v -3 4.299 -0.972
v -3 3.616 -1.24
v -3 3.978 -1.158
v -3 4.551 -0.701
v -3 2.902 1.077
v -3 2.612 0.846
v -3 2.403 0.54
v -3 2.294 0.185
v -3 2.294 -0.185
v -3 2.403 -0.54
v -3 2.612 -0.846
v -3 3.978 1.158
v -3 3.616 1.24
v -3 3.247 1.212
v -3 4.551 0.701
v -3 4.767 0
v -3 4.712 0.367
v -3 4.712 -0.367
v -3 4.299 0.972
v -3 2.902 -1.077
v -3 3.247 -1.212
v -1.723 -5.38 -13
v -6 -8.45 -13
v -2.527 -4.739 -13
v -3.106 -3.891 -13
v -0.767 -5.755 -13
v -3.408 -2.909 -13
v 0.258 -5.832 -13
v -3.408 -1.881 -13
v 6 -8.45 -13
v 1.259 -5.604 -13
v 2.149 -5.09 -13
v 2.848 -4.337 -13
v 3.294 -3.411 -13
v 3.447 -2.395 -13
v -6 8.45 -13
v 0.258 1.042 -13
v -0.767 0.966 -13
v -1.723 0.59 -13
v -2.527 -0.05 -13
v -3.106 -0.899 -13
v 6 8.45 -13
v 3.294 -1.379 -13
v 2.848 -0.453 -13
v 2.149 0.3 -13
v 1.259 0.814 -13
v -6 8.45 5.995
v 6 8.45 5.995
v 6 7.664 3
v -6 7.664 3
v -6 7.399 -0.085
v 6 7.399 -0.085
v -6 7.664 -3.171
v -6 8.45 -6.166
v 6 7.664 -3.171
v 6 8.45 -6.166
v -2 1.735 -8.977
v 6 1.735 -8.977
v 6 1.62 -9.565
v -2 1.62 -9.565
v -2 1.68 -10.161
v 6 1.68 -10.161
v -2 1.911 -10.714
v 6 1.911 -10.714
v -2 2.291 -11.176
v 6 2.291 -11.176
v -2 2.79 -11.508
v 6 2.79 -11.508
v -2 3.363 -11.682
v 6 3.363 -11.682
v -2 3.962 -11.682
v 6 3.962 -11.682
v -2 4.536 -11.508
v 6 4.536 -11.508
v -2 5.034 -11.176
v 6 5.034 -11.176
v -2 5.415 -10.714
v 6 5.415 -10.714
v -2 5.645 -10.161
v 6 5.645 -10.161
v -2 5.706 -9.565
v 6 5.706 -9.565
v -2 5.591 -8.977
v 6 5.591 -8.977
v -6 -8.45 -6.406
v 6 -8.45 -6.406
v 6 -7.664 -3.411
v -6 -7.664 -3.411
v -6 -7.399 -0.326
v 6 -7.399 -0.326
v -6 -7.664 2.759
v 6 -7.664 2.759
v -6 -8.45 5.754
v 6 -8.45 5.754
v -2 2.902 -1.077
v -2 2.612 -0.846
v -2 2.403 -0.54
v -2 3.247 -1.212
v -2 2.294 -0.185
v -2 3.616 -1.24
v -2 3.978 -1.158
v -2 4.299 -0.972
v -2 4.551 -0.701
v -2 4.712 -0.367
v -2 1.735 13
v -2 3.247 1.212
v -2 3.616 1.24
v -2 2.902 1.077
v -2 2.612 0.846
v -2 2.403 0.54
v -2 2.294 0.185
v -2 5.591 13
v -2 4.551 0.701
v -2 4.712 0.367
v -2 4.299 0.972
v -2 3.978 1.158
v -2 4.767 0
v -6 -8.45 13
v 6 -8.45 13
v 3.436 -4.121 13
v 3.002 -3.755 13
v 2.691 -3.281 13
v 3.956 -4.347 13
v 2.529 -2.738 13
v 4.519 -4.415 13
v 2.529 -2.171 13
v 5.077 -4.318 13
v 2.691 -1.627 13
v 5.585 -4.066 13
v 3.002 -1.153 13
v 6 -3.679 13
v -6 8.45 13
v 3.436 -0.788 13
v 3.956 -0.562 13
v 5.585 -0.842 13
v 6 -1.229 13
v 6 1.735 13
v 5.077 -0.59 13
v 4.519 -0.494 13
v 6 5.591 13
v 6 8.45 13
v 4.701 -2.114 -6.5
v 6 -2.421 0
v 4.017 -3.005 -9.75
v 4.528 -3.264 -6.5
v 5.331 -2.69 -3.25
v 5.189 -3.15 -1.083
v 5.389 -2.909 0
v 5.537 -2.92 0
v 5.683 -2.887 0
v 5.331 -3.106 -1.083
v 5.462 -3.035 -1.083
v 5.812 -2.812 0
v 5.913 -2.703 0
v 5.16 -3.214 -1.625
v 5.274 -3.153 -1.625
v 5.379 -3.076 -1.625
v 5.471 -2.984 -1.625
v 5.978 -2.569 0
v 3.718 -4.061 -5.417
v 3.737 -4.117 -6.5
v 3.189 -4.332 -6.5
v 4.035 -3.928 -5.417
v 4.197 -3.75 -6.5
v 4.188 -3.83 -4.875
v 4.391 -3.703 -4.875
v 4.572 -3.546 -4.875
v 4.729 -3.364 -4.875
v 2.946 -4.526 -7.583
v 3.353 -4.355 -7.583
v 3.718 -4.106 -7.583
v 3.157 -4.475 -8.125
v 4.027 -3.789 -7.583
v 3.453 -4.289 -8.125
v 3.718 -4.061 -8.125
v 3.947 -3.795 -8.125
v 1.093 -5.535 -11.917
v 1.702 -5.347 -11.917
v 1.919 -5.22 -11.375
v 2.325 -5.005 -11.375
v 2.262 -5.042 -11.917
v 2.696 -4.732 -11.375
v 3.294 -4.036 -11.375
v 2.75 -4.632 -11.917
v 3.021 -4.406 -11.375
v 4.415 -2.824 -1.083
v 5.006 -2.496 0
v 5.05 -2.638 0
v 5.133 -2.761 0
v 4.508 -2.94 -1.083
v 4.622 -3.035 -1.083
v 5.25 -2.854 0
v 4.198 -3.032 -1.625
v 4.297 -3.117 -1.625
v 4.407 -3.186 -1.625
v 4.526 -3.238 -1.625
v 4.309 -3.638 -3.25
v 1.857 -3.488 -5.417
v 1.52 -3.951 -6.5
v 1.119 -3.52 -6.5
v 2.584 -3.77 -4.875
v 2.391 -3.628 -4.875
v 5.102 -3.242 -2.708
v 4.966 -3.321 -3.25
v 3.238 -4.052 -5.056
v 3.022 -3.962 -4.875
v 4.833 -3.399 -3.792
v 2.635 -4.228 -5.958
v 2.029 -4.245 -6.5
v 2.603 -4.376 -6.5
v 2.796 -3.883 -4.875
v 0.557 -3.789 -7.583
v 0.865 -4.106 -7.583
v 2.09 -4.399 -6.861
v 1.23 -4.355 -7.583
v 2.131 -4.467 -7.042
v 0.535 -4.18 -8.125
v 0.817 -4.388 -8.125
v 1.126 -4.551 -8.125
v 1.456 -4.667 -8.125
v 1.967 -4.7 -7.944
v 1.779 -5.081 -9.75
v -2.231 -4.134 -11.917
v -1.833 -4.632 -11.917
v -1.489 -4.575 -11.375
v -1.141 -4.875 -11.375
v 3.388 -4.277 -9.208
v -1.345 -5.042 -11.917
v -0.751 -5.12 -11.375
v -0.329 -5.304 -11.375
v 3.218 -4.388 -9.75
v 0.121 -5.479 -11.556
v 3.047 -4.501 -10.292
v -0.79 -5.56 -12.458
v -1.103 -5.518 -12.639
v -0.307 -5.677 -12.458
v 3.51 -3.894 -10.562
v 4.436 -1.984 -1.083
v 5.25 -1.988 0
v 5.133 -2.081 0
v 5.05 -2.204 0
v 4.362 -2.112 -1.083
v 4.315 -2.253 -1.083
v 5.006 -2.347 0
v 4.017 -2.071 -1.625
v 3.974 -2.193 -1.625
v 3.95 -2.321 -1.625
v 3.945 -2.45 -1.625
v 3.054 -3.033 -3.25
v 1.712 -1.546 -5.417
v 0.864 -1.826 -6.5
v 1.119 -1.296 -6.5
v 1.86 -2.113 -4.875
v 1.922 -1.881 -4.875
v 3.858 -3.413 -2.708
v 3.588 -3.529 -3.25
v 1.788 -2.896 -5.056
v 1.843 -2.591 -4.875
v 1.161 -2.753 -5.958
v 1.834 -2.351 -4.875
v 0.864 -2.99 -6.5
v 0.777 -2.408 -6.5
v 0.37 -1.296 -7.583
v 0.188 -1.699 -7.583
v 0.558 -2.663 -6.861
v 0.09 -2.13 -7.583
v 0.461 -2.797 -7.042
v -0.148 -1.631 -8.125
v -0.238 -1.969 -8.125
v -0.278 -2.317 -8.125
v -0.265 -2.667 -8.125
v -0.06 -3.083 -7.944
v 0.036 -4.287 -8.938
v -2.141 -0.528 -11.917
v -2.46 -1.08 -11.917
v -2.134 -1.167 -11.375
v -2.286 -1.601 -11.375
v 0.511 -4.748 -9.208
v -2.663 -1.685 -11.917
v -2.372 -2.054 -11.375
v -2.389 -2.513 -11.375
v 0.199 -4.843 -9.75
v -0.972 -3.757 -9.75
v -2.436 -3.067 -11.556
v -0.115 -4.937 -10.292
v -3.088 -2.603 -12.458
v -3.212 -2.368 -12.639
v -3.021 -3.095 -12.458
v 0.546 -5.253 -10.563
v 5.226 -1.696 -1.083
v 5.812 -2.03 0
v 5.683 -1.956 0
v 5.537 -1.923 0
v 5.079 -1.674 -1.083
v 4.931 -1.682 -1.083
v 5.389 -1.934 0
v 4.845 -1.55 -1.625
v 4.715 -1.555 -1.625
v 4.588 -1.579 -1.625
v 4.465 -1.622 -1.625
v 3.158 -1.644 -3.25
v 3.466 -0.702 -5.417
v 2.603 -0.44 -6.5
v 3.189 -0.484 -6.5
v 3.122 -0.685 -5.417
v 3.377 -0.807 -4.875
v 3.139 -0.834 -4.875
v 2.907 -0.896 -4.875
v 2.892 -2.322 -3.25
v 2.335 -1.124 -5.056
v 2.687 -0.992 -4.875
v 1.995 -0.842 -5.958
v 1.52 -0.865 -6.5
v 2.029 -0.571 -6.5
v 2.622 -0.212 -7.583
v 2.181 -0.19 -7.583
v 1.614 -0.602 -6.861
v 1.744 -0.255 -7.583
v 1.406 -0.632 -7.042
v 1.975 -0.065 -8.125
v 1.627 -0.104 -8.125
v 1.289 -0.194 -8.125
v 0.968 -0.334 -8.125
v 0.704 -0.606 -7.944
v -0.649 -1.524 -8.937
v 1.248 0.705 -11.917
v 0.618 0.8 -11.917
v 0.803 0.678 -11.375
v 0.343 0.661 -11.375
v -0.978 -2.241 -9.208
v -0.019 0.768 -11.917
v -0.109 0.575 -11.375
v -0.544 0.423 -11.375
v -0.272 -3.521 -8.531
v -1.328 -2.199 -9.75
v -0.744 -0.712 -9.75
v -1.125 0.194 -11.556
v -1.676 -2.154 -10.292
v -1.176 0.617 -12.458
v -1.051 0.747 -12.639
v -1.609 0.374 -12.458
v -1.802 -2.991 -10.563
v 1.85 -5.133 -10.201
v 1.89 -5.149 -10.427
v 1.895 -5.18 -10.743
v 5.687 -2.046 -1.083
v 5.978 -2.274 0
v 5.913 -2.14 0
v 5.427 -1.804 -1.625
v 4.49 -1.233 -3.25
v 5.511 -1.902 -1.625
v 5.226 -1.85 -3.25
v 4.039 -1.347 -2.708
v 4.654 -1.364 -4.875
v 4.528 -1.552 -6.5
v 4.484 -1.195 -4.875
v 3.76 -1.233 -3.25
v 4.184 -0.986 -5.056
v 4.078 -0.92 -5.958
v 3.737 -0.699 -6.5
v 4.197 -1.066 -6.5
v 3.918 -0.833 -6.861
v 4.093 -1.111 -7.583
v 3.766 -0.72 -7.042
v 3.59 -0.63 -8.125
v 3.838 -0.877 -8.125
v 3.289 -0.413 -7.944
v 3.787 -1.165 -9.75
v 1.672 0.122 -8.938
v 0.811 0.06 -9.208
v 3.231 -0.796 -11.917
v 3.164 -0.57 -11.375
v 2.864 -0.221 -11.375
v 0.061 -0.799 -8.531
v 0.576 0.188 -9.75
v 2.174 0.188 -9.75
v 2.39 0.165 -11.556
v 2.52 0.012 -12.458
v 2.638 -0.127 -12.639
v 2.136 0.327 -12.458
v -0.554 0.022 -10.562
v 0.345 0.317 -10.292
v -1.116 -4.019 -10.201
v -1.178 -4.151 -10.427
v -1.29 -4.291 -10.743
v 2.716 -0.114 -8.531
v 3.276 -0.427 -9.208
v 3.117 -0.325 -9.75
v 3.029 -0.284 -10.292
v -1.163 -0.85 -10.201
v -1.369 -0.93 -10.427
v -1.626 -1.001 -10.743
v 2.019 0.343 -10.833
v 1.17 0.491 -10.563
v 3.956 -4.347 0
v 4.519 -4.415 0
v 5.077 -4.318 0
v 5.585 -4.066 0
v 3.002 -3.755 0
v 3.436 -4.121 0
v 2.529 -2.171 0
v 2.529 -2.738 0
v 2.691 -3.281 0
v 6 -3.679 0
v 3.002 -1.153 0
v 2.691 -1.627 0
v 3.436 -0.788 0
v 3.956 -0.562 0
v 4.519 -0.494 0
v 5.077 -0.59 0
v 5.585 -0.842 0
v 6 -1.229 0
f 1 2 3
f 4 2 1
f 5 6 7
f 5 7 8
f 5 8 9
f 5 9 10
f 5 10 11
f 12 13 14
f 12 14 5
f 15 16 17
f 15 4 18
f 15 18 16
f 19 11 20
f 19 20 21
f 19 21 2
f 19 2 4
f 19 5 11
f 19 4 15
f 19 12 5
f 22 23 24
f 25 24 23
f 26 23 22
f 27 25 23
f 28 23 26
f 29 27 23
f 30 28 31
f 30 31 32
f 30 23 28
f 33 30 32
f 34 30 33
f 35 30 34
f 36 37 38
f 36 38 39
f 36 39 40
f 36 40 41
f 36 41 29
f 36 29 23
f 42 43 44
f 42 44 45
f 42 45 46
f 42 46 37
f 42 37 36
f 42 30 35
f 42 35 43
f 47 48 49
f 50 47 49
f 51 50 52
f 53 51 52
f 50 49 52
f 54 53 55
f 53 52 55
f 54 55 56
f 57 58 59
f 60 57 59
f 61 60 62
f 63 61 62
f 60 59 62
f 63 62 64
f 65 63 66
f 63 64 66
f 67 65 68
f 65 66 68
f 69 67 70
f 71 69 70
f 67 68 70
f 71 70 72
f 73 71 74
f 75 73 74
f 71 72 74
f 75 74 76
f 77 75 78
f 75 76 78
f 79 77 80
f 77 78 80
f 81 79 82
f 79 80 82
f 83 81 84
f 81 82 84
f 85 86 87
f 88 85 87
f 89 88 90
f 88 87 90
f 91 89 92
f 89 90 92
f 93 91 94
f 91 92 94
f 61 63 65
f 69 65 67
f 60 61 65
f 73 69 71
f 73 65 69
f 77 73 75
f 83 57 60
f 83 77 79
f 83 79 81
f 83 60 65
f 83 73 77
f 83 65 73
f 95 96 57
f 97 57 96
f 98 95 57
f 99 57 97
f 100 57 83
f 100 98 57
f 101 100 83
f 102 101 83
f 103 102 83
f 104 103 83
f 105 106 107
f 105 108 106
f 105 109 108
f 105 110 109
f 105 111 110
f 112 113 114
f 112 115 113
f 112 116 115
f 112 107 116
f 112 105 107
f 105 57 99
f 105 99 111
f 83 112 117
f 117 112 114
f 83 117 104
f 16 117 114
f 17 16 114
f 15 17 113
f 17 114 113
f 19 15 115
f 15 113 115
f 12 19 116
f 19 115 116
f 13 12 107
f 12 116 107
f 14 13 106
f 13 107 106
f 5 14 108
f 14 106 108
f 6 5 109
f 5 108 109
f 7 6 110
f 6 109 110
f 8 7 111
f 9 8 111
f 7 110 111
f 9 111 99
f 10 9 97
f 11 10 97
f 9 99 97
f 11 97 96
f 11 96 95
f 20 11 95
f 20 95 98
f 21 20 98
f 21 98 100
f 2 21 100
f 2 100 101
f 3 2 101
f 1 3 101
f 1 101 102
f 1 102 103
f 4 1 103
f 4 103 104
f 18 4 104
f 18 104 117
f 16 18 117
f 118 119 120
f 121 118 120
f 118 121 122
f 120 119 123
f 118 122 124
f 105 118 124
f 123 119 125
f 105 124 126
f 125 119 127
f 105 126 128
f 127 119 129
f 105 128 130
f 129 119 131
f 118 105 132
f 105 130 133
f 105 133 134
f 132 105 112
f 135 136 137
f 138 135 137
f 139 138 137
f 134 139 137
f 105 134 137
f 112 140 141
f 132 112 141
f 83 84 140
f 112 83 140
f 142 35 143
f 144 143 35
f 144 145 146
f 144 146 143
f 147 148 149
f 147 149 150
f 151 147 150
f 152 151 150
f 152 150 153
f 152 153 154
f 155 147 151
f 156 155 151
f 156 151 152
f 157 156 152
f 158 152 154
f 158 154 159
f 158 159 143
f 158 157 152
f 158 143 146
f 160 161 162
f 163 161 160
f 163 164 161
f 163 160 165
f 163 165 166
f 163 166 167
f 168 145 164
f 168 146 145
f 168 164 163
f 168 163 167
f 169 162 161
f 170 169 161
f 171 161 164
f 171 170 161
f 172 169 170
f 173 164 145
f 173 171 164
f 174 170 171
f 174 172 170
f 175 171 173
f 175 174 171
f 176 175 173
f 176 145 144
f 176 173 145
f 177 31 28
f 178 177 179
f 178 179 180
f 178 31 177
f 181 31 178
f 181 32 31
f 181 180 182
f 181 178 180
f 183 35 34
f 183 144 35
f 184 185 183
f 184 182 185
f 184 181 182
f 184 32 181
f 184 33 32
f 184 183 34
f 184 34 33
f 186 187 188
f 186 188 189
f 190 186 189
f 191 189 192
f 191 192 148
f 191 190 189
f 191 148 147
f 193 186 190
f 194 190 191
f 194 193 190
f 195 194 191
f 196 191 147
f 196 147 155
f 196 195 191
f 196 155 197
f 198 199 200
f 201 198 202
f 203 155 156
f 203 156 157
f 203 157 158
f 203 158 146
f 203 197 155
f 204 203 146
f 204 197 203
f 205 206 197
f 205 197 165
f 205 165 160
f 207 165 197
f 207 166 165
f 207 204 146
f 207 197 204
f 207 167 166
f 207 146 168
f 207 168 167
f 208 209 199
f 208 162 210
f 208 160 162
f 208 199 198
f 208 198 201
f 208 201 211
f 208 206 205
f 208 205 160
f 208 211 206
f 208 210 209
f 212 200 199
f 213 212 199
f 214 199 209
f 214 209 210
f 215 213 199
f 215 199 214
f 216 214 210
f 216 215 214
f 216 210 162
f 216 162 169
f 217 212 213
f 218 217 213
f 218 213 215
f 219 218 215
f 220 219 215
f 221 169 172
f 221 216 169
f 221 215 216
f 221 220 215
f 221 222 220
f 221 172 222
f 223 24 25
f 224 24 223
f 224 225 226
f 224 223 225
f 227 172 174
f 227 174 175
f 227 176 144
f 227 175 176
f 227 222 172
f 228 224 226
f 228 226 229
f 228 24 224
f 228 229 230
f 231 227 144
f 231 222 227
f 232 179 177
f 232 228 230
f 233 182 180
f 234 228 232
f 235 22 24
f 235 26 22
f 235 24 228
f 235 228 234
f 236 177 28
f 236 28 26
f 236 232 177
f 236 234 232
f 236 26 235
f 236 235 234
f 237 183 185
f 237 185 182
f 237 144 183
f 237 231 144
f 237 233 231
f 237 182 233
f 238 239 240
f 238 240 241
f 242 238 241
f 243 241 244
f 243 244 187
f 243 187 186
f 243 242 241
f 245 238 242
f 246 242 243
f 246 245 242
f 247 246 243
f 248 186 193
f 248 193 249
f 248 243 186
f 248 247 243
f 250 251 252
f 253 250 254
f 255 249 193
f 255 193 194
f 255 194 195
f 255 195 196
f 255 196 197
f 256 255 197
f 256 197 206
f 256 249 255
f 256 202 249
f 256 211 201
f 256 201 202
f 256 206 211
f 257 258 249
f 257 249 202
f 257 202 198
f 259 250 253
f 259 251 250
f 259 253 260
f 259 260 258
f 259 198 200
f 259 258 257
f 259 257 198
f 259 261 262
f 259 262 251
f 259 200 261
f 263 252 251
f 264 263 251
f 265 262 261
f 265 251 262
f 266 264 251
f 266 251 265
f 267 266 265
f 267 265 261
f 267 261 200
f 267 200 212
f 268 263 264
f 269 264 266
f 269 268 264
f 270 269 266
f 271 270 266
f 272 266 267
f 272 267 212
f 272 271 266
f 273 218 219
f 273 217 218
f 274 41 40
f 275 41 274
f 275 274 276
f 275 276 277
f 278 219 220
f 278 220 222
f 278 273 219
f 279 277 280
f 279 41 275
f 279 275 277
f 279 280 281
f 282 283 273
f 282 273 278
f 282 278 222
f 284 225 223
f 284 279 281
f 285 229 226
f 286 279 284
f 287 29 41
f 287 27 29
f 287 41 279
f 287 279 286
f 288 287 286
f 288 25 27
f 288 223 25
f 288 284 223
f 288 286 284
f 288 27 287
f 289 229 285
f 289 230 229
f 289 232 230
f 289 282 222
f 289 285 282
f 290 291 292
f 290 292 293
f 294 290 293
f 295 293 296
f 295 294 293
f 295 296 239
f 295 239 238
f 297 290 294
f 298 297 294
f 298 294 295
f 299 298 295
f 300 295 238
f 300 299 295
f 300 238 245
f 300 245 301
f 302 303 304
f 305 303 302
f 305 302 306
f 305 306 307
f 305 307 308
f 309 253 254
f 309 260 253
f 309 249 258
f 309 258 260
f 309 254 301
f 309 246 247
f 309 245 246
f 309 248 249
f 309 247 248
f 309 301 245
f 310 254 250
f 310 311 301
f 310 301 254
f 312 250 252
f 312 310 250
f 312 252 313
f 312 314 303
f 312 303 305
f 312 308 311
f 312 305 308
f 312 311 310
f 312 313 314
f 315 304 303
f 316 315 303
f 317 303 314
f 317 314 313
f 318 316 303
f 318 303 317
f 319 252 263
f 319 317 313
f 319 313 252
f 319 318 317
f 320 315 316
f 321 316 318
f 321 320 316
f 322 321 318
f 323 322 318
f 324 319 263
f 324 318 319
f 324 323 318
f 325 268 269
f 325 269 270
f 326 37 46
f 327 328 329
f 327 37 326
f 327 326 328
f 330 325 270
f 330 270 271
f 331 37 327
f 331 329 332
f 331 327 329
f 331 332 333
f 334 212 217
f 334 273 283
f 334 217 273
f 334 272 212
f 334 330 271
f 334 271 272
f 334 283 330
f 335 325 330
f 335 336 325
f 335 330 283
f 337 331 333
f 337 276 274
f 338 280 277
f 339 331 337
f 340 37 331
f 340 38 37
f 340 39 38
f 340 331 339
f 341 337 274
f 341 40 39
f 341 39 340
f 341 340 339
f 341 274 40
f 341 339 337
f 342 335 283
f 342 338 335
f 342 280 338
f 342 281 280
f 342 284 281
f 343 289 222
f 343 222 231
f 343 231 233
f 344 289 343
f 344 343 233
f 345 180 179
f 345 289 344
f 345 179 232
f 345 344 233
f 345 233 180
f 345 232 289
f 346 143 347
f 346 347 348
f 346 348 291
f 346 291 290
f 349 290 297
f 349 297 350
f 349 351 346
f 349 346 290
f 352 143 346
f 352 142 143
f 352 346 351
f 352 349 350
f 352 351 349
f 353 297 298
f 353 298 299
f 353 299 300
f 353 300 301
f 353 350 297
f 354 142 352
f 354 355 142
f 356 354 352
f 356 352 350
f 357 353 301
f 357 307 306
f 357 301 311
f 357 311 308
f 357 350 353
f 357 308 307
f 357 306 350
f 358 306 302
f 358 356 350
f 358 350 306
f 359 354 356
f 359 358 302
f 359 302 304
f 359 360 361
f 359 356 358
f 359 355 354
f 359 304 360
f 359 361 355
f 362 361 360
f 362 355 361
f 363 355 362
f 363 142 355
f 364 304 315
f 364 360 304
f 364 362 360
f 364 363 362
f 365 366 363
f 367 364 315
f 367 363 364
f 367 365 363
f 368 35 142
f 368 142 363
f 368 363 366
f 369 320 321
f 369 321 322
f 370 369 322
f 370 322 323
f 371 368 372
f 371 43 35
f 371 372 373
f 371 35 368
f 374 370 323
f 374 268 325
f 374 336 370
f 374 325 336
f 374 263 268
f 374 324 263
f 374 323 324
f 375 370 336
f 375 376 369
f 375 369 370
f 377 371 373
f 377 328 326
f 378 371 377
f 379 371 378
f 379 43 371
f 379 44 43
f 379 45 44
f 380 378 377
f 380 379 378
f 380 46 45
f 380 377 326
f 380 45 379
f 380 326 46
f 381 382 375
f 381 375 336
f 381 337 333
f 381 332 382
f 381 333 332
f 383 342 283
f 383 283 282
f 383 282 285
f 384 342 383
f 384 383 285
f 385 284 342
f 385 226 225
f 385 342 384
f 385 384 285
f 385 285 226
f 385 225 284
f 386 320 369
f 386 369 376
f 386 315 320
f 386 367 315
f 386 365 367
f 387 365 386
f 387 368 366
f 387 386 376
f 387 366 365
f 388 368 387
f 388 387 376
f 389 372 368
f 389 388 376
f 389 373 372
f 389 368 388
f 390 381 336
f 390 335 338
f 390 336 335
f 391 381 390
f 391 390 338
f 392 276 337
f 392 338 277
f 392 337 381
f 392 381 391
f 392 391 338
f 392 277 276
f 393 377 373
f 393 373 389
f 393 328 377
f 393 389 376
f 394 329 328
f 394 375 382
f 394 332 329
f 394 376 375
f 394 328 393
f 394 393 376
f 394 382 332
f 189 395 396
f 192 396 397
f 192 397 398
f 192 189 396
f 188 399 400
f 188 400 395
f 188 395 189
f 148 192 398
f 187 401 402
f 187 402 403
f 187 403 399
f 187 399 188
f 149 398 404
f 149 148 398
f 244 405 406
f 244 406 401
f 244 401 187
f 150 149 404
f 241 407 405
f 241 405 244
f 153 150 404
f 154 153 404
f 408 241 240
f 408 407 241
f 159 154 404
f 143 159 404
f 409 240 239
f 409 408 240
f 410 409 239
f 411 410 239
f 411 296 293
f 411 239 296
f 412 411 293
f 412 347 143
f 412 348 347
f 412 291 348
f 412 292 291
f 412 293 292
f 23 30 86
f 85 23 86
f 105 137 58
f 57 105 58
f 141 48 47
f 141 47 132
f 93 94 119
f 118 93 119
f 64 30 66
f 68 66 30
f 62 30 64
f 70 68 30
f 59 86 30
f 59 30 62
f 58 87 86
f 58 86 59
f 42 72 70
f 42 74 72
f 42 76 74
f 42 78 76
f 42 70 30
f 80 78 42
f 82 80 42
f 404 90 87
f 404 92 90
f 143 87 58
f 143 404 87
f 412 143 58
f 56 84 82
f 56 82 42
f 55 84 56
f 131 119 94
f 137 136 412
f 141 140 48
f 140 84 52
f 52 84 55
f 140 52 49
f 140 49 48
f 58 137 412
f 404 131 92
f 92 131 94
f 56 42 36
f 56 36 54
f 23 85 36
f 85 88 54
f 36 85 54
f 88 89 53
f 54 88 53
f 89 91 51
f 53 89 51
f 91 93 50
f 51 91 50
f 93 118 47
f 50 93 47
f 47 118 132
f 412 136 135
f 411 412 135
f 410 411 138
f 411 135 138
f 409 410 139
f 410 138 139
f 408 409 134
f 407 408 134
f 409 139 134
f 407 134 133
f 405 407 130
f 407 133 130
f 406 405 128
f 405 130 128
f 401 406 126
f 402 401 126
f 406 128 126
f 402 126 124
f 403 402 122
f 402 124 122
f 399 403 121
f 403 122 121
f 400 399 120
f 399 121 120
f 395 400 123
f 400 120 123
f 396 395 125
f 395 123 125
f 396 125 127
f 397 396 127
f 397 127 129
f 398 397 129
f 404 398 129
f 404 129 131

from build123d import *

# Parameters (mm, degrees)
F0_W      = 16.9
F0_H      = 26
F1_DEPTH  = 6
F4_DEPTH  = 13
F5_R      = 0.5
F7_R      = 3.446906
F11_DEPTH = 12.001
F13_DEPTH = 8
F15_R     = 1.24365
F16_DEPTH = 5


with BuildPart() as f1:
    # F0 (on Right) → F1 (new body, symmetric)
    with BuildSketch(Plane.YZ):
        Rectangle(F0_W, F0_H)
    extrude(amount=F1_DEPTH, both=True)

    # F3 (on offset) → F4 (cut)
    with BuildSketch(Plane.XY.offset(13)):
        with BuildLine():
            Line((6, -3.679424), (6, -1.229189))
            ThreePointArc((6, -1.229189), (2.508033, -2.454307), (6, -3.679424))
        make_face()
    extrude(amount=-F4_DEPTH, mode=Mode.SUBTRACT)

    # F5 (on Top) → F8 section 0
    with BuildSketch(Plane.XY):
        with Locations((5.5, -2.421203)):
            Circle(F5_R)
    # F7 (on offset) → F8 section 1
    with BuildSketch(Plane.XY.offset(-13)):
        with Locations((0, -2.394957)):
            Circle(F7_R)
    loft(mode=Mode.SUBTRACT)

    # F10 (on offset) → F11 (cut, through all)
    with BuildSketch(Plane.YZ.offset(6)):
        with BuildLine():
            Line((8.45, -6.165668), (8.45, 5.995139))
            ThreePointArc((8.45, 5.995139), (7.398846, -0.085264), (8.45, -6.165668))
        make_face()
        with BuildLine():
            Line((-8.45, 5.754331), (-8.45, -6.406476))
            ThreePointArc((-8.45, -6.406476), (-7.398846, -0.326072), (-8.45, 5.754331))
        make_face()
    extrude(amount=-F11_DEPTH, mode=Mode.SUBTRACT)

    # F12 (on offset) → F13 (cut)
    with BuildSketch(Plane.YZ.offset(6)):
        with BuildLine():
            Line((1.735005, 13), (1.735005, -8.976745))
            ThreePointArc((1.735005, -8.976745), (3.66279, -11.704157), (5.590574, -8.976745))
            Line((5.590574, -8.976745), (5.590574, 13))
            Line((5.590574, 13), (1.735005, 13))
        make_face()
    extrude(amount=-F13_DEPTH, mode=Mode.SUBTRACT)

    # F15 (on offset) → F16 (cut)
    with BuildSketch(Plane.YZ.offset(2)):
        with Locations((3.523343, 0)):
            Circle(F15_R)
    extrude(amount=-F16_DEPTH, mode=Mode.SUBTRACT)


solid = f1.part
